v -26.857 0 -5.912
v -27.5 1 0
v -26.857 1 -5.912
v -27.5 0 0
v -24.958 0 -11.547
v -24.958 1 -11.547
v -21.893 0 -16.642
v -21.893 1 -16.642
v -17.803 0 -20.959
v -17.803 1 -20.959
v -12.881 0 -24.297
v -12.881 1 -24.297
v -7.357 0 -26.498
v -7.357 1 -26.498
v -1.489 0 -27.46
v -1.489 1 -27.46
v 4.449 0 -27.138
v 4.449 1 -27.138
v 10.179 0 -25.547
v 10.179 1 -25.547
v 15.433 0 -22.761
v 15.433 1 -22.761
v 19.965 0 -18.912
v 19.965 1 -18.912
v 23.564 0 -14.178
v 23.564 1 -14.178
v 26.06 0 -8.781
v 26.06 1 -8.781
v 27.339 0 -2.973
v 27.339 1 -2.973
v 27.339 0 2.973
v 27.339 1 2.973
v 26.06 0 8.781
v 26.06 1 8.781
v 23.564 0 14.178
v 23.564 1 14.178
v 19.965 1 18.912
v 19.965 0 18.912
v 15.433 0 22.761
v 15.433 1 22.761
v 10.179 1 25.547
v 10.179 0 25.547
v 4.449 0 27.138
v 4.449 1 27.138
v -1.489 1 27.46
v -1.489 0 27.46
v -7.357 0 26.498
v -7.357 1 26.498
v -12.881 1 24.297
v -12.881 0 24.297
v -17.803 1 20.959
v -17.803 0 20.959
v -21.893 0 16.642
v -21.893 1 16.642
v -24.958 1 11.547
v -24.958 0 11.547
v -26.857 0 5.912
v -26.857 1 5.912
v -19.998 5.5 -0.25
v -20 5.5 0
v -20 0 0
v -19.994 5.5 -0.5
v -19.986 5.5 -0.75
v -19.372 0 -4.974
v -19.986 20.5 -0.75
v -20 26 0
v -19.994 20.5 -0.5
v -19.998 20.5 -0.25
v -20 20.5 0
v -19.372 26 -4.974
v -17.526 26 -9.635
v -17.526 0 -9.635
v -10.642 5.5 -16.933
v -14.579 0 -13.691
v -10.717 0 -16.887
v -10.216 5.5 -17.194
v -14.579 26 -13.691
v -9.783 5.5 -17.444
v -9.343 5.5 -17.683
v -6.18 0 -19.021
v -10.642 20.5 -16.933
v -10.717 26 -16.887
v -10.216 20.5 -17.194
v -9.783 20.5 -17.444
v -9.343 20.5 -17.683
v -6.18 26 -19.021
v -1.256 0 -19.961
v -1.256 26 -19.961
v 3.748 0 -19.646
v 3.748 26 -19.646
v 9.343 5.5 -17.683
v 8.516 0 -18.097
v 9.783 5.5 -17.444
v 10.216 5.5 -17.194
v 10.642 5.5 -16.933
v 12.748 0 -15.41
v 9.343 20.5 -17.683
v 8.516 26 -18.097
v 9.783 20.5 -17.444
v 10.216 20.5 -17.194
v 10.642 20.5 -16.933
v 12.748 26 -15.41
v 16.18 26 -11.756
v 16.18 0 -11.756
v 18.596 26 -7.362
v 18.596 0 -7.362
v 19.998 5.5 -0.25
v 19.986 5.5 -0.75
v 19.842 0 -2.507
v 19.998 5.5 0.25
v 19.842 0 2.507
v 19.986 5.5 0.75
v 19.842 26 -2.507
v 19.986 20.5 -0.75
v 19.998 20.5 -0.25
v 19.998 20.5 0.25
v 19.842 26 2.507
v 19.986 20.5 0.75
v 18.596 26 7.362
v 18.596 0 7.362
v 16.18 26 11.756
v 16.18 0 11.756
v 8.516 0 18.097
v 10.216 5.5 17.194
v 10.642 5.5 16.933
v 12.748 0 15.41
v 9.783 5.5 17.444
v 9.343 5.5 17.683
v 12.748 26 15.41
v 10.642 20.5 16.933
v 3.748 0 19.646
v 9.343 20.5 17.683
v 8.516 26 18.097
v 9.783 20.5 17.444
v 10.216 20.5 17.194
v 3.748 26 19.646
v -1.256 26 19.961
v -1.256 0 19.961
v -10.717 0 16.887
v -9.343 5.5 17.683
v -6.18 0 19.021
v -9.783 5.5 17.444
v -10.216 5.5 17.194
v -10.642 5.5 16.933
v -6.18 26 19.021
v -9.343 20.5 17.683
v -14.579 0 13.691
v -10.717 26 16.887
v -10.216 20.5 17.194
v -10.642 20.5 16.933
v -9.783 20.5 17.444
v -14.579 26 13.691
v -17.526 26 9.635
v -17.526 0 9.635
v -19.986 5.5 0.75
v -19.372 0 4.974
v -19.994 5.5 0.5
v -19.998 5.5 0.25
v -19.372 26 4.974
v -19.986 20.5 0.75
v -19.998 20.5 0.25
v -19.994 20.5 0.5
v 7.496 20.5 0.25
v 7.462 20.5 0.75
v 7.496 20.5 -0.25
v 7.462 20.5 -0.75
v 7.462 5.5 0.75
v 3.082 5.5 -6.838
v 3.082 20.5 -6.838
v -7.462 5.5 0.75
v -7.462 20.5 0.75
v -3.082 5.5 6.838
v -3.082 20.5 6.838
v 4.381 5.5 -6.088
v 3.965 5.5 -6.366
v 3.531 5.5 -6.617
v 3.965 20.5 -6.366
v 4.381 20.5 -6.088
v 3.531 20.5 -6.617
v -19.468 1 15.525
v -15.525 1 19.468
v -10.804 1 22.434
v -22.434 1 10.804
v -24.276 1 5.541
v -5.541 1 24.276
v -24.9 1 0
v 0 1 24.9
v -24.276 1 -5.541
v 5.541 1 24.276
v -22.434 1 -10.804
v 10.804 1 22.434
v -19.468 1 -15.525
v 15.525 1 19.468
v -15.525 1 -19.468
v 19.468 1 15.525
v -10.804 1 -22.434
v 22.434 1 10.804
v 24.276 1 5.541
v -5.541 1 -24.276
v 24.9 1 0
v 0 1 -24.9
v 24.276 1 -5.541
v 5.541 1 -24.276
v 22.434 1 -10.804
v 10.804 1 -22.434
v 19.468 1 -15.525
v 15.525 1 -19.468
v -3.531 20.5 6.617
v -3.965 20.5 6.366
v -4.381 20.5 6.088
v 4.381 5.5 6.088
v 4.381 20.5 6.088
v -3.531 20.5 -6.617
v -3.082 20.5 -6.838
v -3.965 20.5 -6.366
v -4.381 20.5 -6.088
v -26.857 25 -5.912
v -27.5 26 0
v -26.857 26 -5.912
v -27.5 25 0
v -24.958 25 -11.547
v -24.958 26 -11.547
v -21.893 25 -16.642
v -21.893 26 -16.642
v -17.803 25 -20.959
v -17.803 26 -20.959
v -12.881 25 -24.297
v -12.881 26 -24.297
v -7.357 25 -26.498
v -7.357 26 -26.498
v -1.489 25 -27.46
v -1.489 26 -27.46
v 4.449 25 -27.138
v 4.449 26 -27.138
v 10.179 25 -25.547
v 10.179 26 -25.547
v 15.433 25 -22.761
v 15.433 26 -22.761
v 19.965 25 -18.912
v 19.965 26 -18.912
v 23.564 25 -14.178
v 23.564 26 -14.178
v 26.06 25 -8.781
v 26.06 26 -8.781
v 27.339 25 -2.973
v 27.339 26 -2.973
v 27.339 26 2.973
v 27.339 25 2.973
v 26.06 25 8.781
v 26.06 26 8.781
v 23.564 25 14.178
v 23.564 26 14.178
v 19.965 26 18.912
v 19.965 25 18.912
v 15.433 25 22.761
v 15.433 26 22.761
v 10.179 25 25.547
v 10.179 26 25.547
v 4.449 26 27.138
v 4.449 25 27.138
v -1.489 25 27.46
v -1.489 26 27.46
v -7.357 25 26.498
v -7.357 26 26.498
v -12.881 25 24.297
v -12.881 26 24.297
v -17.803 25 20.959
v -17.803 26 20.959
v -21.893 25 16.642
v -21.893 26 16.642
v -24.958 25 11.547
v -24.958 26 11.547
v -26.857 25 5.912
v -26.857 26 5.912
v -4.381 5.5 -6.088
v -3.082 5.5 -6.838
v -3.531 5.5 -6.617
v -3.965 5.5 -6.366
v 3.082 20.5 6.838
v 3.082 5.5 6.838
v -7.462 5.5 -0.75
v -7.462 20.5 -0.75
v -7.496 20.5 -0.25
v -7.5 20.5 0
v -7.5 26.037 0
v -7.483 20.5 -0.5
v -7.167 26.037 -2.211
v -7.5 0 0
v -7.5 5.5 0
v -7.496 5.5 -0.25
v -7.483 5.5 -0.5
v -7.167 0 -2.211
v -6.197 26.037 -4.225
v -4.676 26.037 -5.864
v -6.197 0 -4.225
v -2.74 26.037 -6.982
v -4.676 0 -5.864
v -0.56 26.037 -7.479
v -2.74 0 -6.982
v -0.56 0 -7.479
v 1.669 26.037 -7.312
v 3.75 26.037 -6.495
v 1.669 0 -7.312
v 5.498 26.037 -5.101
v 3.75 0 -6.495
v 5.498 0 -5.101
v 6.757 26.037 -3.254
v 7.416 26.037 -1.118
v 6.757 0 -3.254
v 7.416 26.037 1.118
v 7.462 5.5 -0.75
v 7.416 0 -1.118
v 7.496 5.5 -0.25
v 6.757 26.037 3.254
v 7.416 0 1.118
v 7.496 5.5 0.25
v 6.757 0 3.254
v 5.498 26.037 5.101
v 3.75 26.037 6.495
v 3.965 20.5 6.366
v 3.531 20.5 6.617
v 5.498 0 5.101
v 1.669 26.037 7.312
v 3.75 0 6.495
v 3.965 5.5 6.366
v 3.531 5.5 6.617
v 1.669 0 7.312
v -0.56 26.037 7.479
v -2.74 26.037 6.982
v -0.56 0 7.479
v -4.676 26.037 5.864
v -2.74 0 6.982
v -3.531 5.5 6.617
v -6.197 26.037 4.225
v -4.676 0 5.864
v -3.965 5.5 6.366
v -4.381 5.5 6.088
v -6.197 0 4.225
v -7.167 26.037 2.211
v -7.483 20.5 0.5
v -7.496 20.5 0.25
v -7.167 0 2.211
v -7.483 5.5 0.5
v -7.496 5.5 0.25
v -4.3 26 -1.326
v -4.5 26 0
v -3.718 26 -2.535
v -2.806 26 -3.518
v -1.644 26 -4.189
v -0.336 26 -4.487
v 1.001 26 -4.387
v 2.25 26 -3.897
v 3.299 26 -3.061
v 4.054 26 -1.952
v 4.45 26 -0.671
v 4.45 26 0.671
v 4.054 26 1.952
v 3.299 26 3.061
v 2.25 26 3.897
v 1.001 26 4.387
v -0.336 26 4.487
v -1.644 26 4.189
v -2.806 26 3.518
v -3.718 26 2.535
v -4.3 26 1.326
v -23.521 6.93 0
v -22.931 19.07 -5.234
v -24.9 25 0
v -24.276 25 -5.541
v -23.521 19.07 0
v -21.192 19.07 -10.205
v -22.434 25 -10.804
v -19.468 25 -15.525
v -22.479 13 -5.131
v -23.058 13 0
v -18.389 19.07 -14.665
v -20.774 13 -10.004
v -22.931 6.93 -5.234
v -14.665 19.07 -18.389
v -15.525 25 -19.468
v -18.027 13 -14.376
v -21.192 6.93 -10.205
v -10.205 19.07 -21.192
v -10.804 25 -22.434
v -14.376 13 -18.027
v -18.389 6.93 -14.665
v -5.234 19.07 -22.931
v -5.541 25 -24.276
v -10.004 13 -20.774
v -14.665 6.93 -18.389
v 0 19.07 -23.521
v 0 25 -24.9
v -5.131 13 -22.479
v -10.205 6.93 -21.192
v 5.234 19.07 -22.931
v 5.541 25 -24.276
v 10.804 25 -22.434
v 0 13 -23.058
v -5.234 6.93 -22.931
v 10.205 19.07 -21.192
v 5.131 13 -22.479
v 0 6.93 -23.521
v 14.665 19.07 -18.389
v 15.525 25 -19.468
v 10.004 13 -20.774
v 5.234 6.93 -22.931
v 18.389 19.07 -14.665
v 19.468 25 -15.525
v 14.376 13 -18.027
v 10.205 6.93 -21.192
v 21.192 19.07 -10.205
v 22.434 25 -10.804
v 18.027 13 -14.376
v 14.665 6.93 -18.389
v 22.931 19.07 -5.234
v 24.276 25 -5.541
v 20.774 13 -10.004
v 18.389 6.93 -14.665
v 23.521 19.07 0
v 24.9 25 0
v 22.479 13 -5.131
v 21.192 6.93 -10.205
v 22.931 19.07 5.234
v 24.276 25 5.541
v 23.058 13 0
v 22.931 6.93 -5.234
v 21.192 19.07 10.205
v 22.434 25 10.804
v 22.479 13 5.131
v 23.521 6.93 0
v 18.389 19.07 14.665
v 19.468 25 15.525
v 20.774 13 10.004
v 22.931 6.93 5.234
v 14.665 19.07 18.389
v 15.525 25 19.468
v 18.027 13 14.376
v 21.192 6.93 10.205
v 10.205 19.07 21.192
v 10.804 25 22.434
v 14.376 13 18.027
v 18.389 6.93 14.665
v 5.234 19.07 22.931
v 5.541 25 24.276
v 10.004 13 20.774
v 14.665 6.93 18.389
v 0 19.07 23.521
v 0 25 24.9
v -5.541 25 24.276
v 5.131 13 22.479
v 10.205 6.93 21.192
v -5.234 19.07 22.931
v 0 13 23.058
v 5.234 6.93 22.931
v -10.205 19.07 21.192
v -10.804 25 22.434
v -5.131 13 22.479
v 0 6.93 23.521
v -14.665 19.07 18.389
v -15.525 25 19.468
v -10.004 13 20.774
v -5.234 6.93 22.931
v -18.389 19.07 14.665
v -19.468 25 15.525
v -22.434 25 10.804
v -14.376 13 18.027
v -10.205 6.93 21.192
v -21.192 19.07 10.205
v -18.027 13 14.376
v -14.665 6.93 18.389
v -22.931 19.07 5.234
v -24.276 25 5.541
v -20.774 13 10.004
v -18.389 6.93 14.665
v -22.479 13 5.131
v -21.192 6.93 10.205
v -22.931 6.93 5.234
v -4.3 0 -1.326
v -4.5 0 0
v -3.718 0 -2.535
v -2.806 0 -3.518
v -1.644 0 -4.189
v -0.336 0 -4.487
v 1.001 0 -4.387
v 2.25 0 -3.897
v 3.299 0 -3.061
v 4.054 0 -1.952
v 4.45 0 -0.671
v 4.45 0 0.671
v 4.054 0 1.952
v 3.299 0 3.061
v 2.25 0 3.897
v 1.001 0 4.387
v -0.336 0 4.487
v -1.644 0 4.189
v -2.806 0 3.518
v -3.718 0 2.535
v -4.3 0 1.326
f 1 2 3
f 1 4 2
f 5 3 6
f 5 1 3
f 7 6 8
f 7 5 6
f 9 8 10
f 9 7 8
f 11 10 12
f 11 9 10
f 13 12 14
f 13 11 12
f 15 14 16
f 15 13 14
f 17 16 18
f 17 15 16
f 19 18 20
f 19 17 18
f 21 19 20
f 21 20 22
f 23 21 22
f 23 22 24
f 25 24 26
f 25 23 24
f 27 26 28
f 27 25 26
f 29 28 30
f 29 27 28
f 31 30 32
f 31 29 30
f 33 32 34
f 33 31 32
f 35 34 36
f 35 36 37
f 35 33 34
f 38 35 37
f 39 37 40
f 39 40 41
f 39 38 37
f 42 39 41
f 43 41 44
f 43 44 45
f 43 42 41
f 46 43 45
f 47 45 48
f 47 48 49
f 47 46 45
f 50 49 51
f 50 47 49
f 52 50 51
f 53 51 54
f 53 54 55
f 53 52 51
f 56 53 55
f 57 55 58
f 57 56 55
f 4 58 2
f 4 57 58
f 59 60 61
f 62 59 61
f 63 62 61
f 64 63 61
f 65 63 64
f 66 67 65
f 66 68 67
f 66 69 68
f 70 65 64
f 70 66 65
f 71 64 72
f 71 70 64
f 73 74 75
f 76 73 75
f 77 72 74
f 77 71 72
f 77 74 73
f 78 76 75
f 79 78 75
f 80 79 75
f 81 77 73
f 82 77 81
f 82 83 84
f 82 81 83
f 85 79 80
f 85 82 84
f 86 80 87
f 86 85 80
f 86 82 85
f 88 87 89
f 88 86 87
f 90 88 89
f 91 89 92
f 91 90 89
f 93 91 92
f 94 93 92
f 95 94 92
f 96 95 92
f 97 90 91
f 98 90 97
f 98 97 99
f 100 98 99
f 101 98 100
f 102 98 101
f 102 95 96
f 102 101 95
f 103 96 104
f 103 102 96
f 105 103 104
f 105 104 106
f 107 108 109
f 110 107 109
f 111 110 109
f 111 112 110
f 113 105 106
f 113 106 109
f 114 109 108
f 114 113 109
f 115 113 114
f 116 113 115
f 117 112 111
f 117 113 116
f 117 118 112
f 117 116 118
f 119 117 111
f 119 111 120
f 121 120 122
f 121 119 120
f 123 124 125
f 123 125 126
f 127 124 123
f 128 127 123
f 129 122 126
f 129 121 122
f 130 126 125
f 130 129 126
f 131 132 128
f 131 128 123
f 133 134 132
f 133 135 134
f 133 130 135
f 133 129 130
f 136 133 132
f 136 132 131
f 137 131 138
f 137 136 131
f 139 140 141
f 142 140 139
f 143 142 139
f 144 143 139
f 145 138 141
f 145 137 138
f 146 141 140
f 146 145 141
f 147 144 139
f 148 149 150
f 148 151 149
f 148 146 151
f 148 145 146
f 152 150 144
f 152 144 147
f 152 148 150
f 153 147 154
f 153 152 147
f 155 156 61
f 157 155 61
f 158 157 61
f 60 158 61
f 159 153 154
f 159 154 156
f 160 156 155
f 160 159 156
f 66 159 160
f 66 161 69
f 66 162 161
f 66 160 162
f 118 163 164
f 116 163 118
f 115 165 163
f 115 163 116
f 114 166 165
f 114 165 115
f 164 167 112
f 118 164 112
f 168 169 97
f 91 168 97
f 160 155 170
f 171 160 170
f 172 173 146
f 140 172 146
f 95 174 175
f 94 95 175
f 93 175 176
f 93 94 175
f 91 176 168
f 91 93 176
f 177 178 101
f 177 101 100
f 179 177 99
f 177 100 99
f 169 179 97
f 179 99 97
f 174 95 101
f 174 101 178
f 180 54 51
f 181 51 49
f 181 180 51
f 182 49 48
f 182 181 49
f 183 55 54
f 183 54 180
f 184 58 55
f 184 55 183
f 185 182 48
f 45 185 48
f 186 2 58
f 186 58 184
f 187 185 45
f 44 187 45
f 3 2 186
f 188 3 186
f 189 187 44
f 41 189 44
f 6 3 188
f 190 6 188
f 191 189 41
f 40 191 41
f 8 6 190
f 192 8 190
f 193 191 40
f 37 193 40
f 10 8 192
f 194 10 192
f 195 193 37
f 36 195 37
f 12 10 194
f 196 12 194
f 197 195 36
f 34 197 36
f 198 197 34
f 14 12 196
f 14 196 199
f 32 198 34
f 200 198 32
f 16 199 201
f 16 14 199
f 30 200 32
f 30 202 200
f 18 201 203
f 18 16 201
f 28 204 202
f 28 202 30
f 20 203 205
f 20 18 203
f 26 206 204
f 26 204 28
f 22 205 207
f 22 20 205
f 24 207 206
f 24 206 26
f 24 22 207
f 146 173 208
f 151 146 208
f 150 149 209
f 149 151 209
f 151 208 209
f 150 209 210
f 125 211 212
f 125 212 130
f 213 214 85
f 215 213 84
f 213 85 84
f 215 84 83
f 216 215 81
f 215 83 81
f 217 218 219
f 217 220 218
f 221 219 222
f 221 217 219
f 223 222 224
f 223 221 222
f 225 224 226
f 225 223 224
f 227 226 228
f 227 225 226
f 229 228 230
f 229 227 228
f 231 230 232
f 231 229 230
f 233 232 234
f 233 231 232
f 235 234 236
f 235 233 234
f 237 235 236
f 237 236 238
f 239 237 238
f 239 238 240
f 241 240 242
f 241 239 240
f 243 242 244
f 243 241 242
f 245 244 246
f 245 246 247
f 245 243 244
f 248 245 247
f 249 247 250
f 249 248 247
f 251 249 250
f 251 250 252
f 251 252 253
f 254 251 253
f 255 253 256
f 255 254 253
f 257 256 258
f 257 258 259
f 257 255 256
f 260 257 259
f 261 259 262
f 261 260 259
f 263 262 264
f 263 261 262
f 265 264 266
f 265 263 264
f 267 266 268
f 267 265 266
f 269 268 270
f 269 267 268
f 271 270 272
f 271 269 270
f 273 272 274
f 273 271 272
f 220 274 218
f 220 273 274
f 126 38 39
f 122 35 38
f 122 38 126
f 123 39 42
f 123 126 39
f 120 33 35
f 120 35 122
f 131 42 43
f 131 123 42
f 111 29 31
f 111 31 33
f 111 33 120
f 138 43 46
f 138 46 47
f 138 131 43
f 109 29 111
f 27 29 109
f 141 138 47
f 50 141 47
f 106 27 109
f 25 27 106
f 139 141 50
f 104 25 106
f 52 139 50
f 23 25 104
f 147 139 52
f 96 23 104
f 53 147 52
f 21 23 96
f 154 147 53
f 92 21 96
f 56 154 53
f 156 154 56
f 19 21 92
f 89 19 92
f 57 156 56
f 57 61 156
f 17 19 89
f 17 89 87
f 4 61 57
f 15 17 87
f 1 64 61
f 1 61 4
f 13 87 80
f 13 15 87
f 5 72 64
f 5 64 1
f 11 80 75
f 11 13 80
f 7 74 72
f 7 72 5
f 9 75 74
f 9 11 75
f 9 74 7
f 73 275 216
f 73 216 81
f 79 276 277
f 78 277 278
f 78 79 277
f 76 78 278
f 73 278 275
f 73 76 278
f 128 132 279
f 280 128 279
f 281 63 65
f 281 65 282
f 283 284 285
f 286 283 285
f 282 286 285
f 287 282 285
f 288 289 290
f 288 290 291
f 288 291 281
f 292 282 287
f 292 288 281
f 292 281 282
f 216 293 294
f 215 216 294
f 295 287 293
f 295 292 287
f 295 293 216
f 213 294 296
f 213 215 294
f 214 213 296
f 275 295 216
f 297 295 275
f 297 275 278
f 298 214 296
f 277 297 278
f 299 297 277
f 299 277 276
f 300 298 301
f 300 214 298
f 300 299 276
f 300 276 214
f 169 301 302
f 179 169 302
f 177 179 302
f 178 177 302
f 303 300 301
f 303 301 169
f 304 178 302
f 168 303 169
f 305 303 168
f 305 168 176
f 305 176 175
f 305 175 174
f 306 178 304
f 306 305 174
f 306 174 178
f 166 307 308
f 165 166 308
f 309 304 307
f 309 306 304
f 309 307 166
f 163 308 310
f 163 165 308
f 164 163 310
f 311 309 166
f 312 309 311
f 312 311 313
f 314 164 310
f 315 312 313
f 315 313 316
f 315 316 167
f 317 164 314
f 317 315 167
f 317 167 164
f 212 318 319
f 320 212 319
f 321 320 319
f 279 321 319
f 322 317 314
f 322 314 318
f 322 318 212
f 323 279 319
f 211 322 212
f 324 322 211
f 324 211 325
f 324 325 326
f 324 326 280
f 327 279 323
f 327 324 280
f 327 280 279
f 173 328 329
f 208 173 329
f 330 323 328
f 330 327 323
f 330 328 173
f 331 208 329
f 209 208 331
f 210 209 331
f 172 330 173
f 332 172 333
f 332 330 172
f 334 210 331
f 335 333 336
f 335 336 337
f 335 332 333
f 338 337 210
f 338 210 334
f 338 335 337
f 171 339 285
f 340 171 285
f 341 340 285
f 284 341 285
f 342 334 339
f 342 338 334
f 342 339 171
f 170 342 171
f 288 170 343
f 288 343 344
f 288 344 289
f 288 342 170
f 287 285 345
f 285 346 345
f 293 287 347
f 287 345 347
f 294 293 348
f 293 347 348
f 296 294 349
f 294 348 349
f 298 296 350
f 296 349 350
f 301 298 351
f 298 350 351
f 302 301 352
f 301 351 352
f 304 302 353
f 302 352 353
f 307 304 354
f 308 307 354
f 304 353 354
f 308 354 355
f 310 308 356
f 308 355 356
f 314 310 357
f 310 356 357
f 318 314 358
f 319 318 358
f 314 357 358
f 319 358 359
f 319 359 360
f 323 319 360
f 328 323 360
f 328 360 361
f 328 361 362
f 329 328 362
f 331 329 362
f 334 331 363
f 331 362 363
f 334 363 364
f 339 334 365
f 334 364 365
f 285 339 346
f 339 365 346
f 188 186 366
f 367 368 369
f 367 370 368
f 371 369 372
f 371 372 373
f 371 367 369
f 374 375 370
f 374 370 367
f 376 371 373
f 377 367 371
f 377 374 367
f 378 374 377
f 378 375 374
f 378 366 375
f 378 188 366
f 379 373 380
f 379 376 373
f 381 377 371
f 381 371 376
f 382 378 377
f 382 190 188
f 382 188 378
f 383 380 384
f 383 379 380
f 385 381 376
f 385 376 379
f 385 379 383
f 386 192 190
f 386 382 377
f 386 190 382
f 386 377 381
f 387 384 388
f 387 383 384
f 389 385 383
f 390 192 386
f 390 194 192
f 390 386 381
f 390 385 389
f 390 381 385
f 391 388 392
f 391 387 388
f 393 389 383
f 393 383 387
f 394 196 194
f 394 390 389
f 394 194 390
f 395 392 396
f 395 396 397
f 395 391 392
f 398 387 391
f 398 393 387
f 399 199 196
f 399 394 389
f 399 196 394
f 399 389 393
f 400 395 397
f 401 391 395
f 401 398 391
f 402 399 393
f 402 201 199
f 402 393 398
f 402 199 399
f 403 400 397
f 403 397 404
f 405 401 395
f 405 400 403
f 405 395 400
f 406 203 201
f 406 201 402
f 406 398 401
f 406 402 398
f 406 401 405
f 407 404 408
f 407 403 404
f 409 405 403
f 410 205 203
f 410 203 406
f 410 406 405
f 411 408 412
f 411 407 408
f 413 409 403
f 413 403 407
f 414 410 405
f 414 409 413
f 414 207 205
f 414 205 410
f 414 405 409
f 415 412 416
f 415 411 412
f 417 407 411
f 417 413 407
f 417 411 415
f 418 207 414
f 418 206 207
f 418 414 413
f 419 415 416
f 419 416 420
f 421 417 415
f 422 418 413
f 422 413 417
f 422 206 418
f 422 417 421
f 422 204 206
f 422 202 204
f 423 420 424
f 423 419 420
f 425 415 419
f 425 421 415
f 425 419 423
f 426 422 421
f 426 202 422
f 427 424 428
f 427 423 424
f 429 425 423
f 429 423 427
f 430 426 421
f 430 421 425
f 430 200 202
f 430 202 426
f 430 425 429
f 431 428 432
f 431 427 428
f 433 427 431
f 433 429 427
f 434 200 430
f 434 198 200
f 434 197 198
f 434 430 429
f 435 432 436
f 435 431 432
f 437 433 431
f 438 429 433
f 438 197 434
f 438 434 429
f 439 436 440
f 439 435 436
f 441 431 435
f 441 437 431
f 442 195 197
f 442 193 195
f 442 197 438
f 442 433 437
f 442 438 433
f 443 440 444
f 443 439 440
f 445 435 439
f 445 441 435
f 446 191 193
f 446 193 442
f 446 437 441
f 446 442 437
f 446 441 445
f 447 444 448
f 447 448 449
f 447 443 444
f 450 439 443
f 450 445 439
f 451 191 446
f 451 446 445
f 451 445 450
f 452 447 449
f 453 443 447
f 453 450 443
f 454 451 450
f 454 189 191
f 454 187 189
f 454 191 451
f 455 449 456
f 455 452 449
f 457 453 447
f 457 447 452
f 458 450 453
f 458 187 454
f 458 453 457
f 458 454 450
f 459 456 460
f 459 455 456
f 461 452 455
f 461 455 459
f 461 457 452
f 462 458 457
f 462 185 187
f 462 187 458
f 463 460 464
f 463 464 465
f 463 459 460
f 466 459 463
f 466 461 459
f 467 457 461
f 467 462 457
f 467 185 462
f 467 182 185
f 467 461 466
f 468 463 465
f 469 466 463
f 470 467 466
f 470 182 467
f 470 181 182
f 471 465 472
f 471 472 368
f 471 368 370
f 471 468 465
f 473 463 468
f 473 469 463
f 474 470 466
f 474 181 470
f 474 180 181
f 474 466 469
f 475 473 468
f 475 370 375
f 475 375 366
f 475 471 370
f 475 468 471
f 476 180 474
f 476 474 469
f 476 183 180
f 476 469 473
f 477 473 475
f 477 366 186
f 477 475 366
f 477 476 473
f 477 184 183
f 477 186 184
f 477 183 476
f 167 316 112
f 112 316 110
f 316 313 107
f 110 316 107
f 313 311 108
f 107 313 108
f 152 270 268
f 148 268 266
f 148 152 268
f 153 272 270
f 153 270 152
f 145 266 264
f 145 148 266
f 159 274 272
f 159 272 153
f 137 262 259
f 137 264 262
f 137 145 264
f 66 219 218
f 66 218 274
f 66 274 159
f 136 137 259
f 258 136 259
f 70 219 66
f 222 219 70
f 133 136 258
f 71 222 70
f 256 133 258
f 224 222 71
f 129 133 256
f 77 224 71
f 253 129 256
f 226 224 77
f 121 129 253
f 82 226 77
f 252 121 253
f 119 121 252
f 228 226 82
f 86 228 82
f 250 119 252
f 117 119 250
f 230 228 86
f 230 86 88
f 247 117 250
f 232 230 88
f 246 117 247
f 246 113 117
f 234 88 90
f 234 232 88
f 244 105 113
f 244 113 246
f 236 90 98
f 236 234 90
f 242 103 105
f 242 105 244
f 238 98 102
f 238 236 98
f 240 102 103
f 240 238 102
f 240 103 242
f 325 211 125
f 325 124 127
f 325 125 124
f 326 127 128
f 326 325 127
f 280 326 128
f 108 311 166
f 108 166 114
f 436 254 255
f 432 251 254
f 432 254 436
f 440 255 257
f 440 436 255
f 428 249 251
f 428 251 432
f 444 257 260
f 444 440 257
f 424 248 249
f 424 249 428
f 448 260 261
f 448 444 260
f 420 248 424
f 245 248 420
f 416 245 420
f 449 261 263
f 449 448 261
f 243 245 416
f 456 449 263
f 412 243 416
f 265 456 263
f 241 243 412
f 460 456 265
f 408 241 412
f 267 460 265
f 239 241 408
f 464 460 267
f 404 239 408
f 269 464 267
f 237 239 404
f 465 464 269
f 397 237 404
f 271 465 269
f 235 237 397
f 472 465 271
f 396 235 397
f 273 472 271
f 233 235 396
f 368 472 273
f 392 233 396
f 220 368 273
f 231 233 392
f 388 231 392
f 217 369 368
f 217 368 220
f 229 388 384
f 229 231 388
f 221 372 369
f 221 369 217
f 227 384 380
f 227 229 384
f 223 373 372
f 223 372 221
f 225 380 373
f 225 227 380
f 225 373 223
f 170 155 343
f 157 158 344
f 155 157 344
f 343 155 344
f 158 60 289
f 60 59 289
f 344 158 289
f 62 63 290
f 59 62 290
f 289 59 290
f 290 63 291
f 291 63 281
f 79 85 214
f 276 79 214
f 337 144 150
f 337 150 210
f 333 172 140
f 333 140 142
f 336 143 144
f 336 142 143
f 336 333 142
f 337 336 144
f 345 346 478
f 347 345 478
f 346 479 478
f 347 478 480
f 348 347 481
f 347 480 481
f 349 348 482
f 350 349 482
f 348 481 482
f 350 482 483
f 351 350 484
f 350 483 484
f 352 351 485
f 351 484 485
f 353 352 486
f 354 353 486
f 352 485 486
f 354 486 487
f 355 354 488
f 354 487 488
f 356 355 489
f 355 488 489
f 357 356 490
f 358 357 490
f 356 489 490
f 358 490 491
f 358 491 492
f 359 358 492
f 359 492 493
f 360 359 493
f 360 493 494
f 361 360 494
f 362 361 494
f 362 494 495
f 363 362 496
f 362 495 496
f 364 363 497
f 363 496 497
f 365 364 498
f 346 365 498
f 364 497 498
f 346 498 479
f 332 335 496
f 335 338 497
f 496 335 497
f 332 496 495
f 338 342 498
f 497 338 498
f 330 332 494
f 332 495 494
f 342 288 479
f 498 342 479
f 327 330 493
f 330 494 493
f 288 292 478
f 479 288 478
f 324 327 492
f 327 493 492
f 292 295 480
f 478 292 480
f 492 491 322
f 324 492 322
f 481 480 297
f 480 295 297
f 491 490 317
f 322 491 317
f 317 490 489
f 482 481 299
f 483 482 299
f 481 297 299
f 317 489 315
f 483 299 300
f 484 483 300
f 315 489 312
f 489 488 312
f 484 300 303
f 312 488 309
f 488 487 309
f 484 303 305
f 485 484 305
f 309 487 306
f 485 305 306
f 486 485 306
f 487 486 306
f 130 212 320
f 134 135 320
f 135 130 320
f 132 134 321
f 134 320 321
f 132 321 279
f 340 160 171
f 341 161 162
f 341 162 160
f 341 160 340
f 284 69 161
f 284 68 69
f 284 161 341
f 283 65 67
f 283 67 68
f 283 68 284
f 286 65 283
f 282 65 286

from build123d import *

# Parameters (mm, degrees)
BOSS_EXTRUDE1_START = 5.5
SKETCH4_W           = 13.614691885
SKETCH4_H           = 1.5
BOSS_EXTRUDE1_DEPTH = 15


with BuildPart() as part:
    # Sketch1 → Revolve1 (revolve)
    with BuildSketch(Plane.XY):
        with BuildLine():
            Line((-20, 26), (-27.5, 26))
            Line((-27.5, 26), (-27.5, 25))
            Line((-27.5, 25), (-24.9, 25))
            ThreePointArc((-24.9, 25), (-23.057568057, 13), (-24.9, 1))
            Line((-24.9, 1), (-27.5, 1))
            Line((-27.5, 1), (-27.5, 0))
            Line((-27.5, 0), (-20, 0))
            Line((-20, 0), (-20, 5.5))
            Line((-20, 5.5), (-20, 20.5))
            Line((-20, 20.5), (-20, 26))
        make_face()
        Polygon((-4.5, 26), (-4.5, 0), (-7.5, 0), (-7.5, 5.5), (-7.5, 20.5), (-7.5, 26.037065381), align=None)
    revolve(axis=Axis((0, 42.404735677, 0), (0, -1, 0)))

    # Sketch4 → Boss-Extrude1 (add)
    with BuildSketch(Plane(origin=(0, 0, 0), x_dir=(1, 0, 0), z_dir=(0, 1, 0)).offset(BOSS_EXTRUDE1_START)):
        with Locations((13.641384633, 0)):
            Rectangle(SKETCH4_W, SKETCH4_H)
        Polygon((4.066538398, -5.543451116), (10.873884341, -17.334120153), (9.574846235, -18.084120153), (2.767500292, -6.293451116), align=None)
        Polygon((-2.767500292, -6.293451116), (-9.574846235, -18.084120153), (-10.873884341, -17.334120153), (-4.066538398, -5.543451116), align=None)
        with Locations((-13.641384633, 0)):
            Rectangle(SKETCH4_W, SKETCH4_H)
        Polygon((-4.066538398, 5.543451116), (-10.873884341, 17.334120153), (-9.574846235, 18.084120153), (-2.767500292, 6.293451116), align=None)
        Polygon((2.767500292, 6.293451116), (9.574846235, 18.084120153), (10.873884341, 17.334120153), (4.066538398, 5.543451116), align=None)
    extrude(amount=BOSS_EXTRUDE1_DEPTH)


solid = part.part
